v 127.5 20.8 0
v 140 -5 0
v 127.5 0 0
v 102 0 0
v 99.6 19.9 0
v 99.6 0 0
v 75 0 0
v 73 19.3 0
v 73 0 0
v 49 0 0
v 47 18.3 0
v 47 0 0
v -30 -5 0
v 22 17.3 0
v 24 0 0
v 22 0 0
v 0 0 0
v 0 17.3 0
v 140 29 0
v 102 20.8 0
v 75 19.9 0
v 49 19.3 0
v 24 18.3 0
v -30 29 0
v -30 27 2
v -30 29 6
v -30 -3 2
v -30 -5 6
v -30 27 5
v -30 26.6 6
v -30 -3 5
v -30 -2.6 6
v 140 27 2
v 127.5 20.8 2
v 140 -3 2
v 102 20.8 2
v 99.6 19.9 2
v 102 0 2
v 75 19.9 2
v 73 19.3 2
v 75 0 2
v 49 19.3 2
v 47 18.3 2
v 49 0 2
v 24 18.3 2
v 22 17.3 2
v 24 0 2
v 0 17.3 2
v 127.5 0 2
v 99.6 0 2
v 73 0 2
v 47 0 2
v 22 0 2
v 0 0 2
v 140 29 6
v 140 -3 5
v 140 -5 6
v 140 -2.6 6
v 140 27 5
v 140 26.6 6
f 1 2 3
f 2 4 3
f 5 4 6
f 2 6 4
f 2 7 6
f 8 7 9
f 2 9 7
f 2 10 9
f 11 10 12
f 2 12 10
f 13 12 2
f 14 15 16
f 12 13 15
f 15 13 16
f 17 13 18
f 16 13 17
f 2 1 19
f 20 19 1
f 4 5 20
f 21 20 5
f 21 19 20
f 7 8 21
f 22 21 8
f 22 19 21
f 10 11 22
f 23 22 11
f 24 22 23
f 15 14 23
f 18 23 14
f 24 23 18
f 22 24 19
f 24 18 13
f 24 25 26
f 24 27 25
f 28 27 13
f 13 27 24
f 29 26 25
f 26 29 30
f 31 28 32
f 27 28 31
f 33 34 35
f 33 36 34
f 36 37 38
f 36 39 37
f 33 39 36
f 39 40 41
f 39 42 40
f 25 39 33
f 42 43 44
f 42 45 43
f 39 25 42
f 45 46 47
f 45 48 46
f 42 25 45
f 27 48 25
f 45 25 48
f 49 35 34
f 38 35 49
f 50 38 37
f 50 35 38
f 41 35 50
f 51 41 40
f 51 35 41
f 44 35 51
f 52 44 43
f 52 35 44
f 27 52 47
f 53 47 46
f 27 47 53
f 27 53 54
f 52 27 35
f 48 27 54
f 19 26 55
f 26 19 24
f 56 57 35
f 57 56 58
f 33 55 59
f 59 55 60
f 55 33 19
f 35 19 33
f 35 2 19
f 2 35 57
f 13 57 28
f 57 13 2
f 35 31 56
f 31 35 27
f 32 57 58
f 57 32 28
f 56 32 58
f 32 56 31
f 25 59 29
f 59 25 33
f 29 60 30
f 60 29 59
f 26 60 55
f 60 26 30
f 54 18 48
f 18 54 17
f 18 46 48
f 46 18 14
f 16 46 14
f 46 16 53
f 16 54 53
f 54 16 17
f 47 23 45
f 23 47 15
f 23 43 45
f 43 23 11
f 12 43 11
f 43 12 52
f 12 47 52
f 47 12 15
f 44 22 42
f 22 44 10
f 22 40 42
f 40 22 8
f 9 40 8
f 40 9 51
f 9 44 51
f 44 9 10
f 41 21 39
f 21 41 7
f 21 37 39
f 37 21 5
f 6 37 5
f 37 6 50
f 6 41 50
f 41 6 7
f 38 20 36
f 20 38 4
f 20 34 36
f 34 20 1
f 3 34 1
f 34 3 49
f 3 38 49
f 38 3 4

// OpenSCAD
difference() {
    union() {
        color("red") translate([-30,-5,0]) linear_extrude(2) square([170,34]);
        color("blue") translate([-30,-5,2]) linear_extrude(3) square([170,2]);
        color("cyan") translate([-30,-5,5]) linear_extrude(1,scale=[1.0,1.2]) square([170,2]);
        color("green") translate([-30,27,2]) linear_extrude(3) square([170,2]);
        color("lightgreen") translate([140,29,5]) rotate([180,180,0]) linear_extrude(1,scale=[1.0,1.2]) square([170,2]);
    }
    translate([0,0,0]) linear_extrude(2) square([22,17.3]);
    translate([24,0,0]) linear_extrude(2) square([23,18.3]);
    translate([49,0,0]) linear_extrude(2) square([24,19.3]);
    translate([75,0,0]) linear_extrude(2) square([24.6,19.9]);
    translate([102,0,0]) linear_extrude(2) square([25.5,20.8]);
}
